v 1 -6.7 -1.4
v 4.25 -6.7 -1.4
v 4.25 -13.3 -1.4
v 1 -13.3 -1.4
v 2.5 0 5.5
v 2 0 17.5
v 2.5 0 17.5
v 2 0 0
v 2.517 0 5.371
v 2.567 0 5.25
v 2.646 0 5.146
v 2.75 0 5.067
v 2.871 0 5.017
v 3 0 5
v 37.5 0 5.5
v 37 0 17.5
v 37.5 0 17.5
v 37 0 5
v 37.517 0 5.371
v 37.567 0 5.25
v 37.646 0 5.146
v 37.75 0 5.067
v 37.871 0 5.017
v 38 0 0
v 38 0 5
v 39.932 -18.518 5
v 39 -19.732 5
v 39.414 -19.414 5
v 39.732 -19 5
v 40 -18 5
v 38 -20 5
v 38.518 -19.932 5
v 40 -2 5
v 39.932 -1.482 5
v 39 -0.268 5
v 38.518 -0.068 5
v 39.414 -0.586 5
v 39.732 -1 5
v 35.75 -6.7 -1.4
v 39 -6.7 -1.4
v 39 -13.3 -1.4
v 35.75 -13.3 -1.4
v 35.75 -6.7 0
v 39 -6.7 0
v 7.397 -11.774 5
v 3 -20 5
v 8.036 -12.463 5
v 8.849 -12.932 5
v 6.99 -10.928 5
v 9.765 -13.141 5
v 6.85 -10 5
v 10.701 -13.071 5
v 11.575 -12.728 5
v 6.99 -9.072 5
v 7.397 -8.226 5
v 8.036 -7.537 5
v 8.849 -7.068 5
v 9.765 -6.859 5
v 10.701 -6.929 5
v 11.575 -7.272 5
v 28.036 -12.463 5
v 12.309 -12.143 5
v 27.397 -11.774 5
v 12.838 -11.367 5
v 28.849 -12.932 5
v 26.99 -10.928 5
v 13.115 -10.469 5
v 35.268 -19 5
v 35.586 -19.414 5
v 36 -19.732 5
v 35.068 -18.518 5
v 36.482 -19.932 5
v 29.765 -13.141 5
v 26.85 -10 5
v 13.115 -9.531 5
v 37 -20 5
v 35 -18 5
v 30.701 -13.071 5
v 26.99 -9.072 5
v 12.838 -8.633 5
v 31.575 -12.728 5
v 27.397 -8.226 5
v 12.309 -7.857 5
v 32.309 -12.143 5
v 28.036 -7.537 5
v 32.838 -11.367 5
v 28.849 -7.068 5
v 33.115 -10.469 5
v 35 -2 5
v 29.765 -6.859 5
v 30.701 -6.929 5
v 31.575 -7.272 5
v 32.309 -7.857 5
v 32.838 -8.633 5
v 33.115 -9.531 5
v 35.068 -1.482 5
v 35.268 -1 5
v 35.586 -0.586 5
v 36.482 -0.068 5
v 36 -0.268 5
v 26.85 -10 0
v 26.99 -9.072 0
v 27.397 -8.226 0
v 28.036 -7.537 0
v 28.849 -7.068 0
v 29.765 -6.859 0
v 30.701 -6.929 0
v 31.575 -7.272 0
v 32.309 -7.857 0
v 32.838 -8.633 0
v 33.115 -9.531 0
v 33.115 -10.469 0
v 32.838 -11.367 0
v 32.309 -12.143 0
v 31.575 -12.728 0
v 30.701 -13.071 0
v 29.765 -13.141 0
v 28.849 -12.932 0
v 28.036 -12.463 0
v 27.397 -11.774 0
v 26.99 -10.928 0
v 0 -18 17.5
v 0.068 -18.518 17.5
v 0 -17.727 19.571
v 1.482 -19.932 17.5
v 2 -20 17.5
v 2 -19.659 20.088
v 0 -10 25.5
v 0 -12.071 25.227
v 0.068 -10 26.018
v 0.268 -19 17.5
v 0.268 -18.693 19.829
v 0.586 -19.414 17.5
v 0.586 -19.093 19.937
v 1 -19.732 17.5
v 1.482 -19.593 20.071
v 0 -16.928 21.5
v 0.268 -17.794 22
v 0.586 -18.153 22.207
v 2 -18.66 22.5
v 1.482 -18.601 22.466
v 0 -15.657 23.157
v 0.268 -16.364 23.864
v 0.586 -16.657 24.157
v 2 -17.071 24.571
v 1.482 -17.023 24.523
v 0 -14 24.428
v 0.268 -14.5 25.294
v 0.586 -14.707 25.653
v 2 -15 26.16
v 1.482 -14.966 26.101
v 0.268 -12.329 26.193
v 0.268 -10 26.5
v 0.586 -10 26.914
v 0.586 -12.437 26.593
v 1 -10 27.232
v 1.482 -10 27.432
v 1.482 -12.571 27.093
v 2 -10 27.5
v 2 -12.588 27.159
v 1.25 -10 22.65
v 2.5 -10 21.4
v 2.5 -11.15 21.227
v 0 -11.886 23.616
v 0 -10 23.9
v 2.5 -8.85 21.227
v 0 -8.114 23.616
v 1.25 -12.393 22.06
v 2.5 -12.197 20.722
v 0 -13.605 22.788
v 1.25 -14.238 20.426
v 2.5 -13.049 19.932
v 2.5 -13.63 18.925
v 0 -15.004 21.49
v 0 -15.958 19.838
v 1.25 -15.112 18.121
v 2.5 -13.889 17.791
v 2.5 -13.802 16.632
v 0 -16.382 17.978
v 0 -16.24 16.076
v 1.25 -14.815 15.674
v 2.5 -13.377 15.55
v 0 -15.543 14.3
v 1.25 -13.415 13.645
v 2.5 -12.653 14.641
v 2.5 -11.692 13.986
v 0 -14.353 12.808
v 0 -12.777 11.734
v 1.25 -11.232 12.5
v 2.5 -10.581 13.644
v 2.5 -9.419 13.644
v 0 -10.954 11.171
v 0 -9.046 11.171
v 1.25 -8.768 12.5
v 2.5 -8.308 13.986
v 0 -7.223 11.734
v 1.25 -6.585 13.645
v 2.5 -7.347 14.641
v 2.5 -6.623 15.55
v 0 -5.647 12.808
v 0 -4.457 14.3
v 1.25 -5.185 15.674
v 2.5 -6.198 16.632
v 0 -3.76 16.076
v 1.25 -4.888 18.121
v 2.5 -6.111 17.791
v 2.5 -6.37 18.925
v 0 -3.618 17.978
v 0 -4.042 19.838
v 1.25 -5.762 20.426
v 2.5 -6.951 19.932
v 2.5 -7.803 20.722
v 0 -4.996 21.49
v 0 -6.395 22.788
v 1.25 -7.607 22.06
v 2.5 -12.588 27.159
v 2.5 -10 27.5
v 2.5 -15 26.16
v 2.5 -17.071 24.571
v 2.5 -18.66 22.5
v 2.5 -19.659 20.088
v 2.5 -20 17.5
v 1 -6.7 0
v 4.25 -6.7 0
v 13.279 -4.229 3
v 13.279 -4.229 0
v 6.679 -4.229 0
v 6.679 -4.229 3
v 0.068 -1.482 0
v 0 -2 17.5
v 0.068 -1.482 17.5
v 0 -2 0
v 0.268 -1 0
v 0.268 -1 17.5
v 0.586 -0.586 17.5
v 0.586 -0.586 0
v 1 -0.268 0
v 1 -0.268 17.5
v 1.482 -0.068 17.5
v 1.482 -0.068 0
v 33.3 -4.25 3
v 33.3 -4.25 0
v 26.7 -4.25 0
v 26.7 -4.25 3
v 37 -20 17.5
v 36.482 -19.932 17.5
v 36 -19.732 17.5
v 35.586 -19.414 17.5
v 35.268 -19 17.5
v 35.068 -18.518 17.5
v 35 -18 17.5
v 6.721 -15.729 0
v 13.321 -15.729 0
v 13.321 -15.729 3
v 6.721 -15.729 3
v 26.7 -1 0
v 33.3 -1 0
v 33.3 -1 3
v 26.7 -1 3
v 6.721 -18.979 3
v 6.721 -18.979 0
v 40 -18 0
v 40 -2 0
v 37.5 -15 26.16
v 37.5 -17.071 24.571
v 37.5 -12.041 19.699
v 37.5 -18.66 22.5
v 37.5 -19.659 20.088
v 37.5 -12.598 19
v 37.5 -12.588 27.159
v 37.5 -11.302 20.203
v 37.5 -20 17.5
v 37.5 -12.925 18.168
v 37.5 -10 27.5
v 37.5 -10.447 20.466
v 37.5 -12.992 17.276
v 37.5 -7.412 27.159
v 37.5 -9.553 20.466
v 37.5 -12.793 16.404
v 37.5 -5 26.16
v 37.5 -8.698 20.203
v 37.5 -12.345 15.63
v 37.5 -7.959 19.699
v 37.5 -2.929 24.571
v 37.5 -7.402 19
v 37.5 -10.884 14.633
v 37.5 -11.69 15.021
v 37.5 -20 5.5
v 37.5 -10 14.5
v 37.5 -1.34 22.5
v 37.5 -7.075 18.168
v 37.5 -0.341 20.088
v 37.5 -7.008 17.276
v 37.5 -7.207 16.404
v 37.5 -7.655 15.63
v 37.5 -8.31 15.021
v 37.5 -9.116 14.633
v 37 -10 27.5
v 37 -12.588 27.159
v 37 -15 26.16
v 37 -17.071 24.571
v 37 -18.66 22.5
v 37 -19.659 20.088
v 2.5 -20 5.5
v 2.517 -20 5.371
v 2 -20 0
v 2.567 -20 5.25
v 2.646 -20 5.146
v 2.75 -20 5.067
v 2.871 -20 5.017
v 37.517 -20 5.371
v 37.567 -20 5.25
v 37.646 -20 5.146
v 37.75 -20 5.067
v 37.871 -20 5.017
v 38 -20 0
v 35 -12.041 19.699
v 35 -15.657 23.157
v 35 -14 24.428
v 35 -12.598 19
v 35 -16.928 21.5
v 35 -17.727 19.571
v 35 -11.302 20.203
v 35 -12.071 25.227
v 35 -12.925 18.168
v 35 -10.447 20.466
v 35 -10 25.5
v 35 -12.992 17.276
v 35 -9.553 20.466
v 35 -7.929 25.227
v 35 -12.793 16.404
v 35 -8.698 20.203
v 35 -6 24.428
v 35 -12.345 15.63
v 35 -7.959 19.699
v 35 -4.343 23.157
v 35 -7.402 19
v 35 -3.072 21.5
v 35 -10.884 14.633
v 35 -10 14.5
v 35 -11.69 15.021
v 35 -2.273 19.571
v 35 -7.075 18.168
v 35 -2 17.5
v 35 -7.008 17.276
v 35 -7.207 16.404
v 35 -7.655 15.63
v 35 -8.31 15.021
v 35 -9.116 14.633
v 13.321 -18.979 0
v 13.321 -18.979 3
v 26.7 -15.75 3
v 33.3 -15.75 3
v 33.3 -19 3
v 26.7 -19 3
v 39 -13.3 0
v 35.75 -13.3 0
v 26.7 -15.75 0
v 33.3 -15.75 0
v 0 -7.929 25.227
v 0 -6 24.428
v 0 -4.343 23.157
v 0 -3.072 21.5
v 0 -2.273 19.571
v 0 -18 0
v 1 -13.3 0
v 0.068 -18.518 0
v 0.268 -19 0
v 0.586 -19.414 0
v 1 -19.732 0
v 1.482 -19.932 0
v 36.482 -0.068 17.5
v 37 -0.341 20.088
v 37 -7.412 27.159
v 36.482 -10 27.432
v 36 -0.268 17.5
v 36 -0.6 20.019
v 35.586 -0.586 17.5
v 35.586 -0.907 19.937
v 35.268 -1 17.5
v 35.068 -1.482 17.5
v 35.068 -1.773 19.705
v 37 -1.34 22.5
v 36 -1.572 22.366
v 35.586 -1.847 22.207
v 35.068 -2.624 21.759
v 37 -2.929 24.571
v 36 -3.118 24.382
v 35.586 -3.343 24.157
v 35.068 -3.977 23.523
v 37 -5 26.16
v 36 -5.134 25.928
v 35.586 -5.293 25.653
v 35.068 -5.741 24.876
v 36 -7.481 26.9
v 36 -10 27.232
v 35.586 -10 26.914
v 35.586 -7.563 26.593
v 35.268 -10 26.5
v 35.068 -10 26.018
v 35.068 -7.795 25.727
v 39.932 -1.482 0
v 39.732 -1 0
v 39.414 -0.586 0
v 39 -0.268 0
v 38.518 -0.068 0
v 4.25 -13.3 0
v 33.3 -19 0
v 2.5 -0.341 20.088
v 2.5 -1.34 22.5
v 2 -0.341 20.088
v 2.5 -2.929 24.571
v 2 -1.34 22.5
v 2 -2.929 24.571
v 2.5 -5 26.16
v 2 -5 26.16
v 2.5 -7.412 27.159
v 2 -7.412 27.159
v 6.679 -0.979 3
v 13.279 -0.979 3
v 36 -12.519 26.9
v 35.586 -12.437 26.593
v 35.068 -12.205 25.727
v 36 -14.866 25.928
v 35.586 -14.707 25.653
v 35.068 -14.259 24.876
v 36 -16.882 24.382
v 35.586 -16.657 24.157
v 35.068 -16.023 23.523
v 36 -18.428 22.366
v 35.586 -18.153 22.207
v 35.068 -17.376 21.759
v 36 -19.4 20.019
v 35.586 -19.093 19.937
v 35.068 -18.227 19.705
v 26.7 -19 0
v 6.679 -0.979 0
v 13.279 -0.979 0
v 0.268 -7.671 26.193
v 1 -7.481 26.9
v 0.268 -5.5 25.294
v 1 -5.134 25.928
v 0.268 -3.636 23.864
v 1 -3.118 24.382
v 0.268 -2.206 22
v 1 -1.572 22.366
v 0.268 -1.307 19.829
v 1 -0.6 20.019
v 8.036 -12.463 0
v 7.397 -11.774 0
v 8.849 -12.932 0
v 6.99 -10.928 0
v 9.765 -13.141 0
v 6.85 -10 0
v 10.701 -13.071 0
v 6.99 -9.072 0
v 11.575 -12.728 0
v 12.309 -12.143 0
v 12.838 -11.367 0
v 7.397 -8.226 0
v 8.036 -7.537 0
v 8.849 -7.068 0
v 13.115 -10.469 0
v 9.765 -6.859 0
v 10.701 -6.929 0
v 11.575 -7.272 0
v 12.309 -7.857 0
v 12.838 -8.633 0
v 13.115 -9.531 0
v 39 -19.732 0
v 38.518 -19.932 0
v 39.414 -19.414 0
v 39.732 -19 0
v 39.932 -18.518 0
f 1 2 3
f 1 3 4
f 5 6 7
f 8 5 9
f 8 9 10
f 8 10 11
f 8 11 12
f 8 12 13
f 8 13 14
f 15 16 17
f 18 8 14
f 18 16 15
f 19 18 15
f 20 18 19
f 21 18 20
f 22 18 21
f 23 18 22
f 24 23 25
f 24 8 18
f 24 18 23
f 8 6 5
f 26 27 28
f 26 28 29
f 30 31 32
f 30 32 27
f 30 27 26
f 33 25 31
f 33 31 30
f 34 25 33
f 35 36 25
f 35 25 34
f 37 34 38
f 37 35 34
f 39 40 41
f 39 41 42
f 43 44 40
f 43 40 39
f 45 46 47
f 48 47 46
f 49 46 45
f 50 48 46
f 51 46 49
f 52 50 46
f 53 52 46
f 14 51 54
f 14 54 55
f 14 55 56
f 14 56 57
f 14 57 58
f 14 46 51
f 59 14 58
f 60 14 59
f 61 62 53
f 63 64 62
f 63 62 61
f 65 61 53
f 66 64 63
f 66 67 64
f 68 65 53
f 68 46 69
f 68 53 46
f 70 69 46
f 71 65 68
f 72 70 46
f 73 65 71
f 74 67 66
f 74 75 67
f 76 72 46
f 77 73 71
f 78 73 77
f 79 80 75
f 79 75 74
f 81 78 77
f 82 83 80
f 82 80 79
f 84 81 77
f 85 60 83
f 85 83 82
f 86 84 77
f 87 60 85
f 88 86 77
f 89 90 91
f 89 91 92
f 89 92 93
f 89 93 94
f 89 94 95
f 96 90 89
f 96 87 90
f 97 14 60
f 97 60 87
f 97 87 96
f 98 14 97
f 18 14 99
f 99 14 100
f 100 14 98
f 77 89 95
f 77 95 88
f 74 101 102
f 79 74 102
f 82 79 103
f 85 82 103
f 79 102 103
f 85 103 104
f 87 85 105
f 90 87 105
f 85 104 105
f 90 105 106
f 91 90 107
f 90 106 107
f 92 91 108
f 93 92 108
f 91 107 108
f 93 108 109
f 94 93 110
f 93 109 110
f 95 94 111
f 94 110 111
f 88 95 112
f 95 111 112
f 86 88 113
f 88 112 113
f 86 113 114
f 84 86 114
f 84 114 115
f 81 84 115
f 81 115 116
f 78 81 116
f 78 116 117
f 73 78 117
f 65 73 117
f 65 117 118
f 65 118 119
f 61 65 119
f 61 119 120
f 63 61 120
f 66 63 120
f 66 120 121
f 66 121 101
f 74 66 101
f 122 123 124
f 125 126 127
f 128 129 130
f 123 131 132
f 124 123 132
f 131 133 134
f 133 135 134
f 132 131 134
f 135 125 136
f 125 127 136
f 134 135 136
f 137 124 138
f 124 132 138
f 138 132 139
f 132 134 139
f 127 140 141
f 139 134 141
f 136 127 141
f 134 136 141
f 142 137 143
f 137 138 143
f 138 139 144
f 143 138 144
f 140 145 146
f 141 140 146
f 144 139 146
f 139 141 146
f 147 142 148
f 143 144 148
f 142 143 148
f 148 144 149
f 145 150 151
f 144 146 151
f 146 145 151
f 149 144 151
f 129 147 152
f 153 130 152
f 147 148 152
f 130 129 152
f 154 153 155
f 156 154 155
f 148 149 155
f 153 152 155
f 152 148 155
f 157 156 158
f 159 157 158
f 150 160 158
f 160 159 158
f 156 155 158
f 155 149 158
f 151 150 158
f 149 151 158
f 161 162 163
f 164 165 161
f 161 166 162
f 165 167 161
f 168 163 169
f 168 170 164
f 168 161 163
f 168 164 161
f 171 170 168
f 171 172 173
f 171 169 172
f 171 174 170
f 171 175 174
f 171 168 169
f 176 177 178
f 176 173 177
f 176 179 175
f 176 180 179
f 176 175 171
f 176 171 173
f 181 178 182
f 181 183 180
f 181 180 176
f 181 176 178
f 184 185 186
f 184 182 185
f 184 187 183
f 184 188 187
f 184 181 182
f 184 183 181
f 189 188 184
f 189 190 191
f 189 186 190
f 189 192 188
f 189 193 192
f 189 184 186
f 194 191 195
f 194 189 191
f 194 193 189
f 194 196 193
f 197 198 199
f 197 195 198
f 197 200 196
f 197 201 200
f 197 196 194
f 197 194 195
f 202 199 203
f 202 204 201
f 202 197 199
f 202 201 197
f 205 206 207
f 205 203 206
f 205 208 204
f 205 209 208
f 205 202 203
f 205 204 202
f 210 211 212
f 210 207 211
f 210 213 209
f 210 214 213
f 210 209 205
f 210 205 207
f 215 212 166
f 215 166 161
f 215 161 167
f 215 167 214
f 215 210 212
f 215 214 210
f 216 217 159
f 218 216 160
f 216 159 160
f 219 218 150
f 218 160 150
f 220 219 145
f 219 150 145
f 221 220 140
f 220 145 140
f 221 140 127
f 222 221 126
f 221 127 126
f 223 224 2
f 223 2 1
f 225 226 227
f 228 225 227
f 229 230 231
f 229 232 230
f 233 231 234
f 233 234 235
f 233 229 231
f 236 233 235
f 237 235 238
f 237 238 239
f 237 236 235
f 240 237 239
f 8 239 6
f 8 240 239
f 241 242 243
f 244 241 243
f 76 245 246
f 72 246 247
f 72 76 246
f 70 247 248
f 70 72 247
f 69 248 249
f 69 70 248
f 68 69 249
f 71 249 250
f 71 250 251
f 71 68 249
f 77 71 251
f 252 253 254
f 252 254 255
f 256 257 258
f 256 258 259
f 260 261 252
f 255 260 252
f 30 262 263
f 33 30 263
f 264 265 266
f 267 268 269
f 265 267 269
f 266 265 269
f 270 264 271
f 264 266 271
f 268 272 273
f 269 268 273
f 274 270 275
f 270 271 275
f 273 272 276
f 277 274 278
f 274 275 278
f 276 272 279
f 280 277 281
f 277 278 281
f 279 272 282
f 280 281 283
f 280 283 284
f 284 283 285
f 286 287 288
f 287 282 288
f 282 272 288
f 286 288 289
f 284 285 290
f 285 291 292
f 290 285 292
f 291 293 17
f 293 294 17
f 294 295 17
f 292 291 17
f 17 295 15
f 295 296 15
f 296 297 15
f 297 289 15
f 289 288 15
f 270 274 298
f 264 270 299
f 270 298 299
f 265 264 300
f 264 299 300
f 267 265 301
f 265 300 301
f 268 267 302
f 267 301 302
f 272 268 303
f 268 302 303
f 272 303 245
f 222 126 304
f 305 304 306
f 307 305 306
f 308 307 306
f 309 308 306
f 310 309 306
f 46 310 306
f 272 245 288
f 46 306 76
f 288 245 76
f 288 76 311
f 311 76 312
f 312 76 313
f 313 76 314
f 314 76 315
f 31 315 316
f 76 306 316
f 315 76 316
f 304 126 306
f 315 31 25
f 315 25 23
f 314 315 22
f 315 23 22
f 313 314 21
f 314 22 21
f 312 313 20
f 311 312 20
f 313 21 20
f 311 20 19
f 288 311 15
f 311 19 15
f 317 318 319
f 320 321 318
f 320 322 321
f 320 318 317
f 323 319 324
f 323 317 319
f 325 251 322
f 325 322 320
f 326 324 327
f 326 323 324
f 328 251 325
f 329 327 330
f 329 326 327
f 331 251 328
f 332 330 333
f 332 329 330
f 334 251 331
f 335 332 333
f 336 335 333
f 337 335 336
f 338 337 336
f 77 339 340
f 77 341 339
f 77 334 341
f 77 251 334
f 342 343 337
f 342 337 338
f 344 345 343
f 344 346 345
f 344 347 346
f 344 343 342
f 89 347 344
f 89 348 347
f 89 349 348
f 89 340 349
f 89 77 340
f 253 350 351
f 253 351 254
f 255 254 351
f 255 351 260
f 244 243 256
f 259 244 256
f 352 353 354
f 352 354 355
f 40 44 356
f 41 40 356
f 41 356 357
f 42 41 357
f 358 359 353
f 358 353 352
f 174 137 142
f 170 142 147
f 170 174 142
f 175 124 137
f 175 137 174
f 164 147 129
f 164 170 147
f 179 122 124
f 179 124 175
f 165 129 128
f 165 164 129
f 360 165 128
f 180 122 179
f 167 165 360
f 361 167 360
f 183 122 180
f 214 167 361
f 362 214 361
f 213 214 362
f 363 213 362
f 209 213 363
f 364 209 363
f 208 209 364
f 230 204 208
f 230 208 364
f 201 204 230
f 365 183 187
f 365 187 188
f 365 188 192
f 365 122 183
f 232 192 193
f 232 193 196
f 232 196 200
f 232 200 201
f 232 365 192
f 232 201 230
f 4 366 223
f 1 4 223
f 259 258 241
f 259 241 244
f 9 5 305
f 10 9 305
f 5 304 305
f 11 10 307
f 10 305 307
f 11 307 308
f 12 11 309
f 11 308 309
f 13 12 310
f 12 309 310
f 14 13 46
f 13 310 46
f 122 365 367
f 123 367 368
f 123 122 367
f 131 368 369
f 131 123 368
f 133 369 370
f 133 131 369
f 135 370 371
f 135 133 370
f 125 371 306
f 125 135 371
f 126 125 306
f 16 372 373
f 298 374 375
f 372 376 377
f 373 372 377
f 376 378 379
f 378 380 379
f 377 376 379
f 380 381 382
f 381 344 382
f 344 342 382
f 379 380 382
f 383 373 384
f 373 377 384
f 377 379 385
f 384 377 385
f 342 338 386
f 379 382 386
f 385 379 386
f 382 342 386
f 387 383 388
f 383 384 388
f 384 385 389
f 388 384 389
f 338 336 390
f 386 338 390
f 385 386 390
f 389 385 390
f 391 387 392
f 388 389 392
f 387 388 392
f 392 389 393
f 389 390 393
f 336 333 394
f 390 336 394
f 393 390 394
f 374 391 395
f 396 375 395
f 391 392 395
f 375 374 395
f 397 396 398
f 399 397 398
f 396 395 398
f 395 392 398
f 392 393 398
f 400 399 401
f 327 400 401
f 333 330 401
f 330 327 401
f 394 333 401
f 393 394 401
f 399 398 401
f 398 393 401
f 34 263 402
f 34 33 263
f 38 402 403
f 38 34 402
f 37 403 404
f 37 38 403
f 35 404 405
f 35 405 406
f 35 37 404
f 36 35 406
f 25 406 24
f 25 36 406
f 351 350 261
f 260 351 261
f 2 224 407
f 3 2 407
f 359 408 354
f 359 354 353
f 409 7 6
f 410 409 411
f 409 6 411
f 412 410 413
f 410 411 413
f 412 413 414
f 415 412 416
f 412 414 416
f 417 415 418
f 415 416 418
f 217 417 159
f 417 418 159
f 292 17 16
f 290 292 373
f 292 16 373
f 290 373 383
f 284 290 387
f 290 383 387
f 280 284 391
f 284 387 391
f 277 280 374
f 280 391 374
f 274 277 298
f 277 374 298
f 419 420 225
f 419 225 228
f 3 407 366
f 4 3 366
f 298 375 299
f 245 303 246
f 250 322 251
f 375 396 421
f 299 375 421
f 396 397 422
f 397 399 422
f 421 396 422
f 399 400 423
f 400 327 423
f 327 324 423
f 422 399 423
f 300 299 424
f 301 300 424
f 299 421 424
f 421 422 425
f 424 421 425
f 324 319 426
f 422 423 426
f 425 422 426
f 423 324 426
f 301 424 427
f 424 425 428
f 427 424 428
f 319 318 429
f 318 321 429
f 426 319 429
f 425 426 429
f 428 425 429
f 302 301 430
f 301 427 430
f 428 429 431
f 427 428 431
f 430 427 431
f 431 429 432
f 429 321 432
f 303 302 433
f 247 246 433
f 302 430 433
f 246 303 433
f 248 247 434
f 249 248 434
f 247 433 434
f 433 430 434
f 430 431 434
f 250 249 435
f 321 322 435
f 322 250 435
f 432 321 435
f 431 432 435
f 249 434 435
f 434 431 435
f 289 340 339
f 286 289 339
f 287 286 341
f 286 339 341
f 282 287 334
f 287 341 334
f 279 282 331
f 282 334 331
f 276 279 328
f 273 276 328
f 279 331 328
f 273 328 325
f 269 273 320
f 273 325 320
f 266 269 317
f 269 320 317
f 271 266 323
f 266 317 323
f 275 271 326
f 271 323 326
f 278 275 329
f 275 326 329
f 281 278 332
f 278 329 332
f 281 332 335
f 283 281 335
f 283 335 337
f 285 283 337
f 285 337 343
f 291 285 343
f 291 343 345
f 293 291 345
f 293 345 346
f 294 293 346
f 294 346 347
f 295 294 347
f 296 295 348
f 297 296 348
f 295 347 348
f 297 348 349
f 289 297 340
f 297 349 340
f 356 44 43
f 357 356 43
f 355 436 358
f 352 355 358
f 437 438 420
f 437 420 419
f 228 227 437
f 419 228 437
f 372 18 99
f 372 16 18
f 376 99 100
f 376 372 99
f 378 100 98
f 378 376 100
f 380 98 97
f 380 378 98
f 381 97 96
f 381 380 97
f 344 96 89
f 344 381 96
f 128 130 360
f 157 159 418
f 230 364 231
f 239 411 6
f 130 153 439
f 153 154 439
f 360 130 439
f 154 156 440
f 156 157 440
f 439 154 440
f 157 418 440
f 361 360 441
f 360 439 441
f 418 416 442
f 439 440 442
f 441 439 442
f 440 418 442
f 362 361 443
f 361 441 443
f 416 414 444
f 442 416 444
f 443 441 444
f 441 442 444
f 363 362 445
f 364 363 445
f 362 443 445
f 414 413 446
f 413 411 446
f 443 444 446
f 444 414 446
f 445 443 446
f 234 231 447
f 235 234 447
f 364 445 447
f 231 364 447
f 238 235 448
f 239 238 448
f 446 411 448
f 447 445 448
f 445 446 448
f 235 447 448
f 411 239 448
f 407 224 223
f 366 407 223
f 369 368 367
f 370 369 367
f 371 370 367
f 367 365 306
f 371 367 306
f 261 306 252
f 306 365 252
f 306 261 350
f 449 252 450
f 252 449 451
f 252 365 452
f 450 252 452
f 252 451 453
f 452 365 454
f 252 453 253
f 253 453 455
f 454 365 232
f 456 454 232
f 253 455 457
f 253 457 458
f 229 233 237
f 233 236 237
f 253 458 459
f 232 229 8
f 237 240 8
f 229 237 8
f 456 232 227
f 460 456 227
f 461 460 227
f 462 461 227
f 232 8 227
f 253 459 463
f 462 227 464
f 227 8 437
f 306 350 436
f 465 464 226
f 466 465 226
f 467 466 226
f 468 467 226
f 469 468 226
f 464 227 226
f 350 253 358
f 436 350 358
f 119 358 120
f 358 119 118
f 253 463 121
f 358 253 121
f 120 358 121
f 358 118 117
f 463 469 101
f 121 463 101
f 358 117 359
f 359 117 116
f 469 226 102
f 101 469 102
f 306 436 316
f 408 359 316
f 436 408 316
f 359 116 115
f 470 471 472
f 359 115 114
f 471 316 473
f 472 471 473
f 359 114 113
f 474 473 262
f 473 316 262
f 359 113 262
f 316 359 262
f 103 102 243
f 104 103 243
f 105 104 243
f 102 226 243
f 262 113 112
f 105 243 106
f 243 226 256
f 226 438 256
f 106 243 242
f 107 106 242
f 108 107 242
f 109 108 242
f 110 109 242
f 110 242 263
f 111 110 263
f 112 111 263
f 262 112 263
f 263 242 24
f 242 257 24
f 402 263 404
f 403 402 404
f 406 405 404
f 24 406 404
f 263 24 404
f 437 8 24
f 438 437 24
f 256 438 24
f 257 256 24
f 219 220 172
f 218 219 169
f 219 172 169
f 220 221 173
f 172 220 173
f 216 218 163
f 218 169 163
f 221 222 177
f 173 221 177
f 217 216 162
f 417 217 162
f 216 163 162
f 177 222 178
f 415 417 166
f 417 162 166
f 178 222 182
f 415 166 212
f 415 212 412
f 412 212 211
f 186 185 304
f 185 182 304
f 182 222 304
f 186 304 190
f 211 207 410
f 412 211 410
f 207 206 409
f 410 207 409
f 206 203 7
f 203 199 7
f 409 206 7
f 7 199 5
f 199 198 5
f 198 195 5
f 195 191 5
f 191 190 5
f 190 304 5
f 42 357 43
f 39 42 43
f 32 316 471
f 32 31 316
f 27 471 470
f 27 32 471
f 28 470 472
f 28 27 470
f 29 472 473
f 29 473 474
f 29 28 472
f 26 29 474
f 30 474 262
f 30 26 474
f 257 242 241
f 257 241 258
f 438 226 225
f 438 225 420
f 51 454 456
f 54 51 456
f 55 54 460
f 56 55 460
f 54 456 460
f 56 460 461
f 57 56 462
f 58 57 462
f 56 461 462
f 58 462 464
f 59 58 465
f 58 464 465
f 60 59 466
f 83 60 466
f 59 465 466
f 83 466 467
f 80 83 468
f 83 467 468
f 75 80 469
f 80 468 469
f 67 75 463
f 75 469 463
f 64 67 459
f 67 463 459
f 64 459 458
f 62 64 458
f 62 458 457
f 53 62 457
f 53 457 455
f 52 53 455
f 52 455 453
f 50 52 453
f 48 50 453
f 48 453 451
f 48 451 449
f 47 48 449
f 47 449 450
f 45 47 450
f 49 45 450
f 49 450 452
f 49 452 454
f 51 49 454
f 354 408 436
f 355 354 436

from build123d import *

# Parameters (mm, degrees)
SKETCH_1_W          = 40
SKETCH_1_H          = 20
EXTRUDE_1_DEPTH     = 5
SKETCH_2_W          = 2.5
SKETCH_2_H          = 20
EXTRUDE_2_DEPTH     = 27.5
SKETCH_3_W          = 6.6
SKETCH_3_H          = 3.25
CUT_EXTRUDE_1_DEPTH = 3
SKETCH_3_3_R        = 3.15
CUT_EXTRUDE_2_DEPTH = 53.5
SKETCH_3_4_W        = 3.25
SKETCH_3_4_H        = 6.6
EXTRUDE_3_DEPTH     = 1.4
EXTRUDE_3_2_DEPTH   = 1.4
SKETCH_4_W          = 2.5
SKETCH_4_H          = 20
EXTRUDE_4_DEPTH     = 22.5
CUT_EXTRUDE_3_DEPTH = 53.5
SKETCH_8_W          = 3
SKETCH_8_H          = 2.501
FILLET_2_R          = 2
FILLET_3_R          = 2
FILLET_4_R          = 0.5


with BuildPart() as part:
    # 草图1 → 凸台-拉伸1 (new body)
    with BuildSketch(Plane.XY):
        with Locations((20, -10)):
            Rectangle(SKETCH_1_W, SKETCH_1_H)
    extrude(amount=EXTRUDE_1_DEPTH)

    # 草图2 → 凸台-拉伸2 (add)
    with BuildSketch(Plane.XY):
        with Locations((1.25, -10)):
            Rectangle(SKETCH_2_W, SKETCH_2_H)
    extrude(amount=EXTRUDE_2_DEPTH)

    # 草图3 → 切除-拉伸1 (cut)
    with BuildSketch(Plane(origin=(0, 0, 0), x_dir=(-1, 0, 0), z_dir=(0, 0, -1))):
        with Locations((-30, -2.625)):
            Rectangle(SKETCH_3_W, SKETCH_3_H)
        with Locations((-30, -17.375)):
            Rectangle(SKETCH_3_W, SKETCH_3_H)
        with Locations((-10.02083306, -17.35416694)):
            Rectangle(SKETCH_3_W, SKETCH_3_H)
        with Locations((-9.97916694, -2.60416694)):
            Rectangle(SKETCH_3_W, SKETCH_3_H)
    extrude(amount=-CUT_EXTRUDE_1_DEPTH, mode=Mode.SUBTRACT)

    # 草图3<3> → 切除-拉伸2 (cut, through all)
    with BuildSketch(Plane(origin=(0, 0, 0), x_dir=(-1, 0, 0), z_dir=(0, 0, -1))):
        with Locations((-30, -10)):
            Circle(SKETCH_3_3_R)
        with Locations((-10, -10)):
            Circle(SKETCH_3_3_R)
    extrude(amount=-CUT_EXTRUDE_2_DEPTH, mode=Mode.SUBTRACT)

    # 草图4 → 凸台-拉伸4 (add)
    with BuildSketch(Plane.XY.offset(5)):
        with Locations((36.25, -10)):
            Rectangle(SKETCH_4_W, SKETCH_4_H)
    extrude(amount=EXTRUDE_4_DEPTH)

    # 草图5 → 切除-拉伸3 (cut, through all)
    with BuildSketch(Plane.ZY):
        with BuildLine():
            Line((27.5, -20), (27.5, -10))
            ThreePointArc((27.5, -10), (24.571067812, -17.071067812), (17.5, -20))
            Line((17.5, -20), (27.5, -20))
        make_face()
        with BuildLine():
            Line((27.5, 0), (17.5, 0))
            ThreePointArc((17.5, 0), (24.571067812, -2.928932188), (27.5, -10))
            Line((27.5, -10), (27.5, 0))
        make_face()
    extrude(amount=-CUT_EXTRUDE_3_DEPTH, mode=Mode.SUBTRACT)

    # 草图8 → Hole Wizard M6 _1 (revolve, cut)
    with BuildSketch(Plane(origin=(37.5, -10, 17.5), x_dir=(0, 0, -1), z_dir=(0, 1, 0))):
        with Locations((1.5, 1.2505)):
            Rectangle(SKETCH_8_W, SKETCH_8_H)
    revolve(axis=Axis((43.85, -10, 17.5), (-1, 0, 0)), mode=Mode.SUBTRACT)

    # 草图10 → Hole Wizard M6 _1 2 (revolve, cut)
    with BuildSketch(Plane(origin=(0, -10, 17.5), x_dir=(0, 0, 1), z_dir=(0, 1, 0))):
        Polygon((0, 0), (0, 2.501), (3.3, 2.501), (3.3, 3.1), (6.4, 0), align=None)
    revolve(axis=Axis((-6.35, -10, 17.5), (1, 0, 0)), mode=Mode.SUBTRACT)

    # 圆角2
    fillet_2_edges = [part.edges().sort_by_distance(p)[0] for p in [
        (35, 0, 11.25),
        (35, -20, 11.25),
        (0, -20, 8.75),
        (0, 0, 8.75),
        (35, -10, 27.5),
        (0, -10, 27.5),
    ]]
    fillet(fillet_2_edges, radius=FILLET_2_R)

    # 圆角3
    fillet_3_edges = [part.edges().sort_by_distance(p)[0] for p in [
        (40, 0, 2.5),
        (40, -20, 2.5),
    ]]
    fillet(fillet_3_edges, radius=FILLET_3_R)

    # 圆角4
    fillet_4_edges = [part.edges().sort_by_distance(p)[0] for p in [
        (37.5, -10, 5),
        (2.5, -10, 5),
    ]]
    fillet(fillet_4_edges, radius=FILLET_4_R)


with BuildPart() as body_2:
    # 草图3<4> → 凸台-拉伸3 (new body)
    with BuildSketch(Plane(origin=(0, 0, 0), x_dir=(-1, 0, 0), z_dir=(0, 0, -1))):
        with Locations((-2.625, -10)):
            Rectangle(SKETCH_3_4_W, SKETCH_3_4_H)
    extrude(amount=EXTRUDE_3_DEPTH)


with BuildPart() as body_3:
    # 草图3<4> → Extrude 3 2 (new body)
    with BuildSketch(Plane(origin=(0, 0, 0), x_dir=(-1, 0, 0), z_dir=(0, 0, -1))):
        with Locations((-37.375, -10)):
            Rectangle(SKETCH_3_4_W, SKETCH_3_4_H)
    extrude(amount=EXTRUDE_3_2_DEPTH)


solid = Compound([part.part, body_2.part, body_3.part])
